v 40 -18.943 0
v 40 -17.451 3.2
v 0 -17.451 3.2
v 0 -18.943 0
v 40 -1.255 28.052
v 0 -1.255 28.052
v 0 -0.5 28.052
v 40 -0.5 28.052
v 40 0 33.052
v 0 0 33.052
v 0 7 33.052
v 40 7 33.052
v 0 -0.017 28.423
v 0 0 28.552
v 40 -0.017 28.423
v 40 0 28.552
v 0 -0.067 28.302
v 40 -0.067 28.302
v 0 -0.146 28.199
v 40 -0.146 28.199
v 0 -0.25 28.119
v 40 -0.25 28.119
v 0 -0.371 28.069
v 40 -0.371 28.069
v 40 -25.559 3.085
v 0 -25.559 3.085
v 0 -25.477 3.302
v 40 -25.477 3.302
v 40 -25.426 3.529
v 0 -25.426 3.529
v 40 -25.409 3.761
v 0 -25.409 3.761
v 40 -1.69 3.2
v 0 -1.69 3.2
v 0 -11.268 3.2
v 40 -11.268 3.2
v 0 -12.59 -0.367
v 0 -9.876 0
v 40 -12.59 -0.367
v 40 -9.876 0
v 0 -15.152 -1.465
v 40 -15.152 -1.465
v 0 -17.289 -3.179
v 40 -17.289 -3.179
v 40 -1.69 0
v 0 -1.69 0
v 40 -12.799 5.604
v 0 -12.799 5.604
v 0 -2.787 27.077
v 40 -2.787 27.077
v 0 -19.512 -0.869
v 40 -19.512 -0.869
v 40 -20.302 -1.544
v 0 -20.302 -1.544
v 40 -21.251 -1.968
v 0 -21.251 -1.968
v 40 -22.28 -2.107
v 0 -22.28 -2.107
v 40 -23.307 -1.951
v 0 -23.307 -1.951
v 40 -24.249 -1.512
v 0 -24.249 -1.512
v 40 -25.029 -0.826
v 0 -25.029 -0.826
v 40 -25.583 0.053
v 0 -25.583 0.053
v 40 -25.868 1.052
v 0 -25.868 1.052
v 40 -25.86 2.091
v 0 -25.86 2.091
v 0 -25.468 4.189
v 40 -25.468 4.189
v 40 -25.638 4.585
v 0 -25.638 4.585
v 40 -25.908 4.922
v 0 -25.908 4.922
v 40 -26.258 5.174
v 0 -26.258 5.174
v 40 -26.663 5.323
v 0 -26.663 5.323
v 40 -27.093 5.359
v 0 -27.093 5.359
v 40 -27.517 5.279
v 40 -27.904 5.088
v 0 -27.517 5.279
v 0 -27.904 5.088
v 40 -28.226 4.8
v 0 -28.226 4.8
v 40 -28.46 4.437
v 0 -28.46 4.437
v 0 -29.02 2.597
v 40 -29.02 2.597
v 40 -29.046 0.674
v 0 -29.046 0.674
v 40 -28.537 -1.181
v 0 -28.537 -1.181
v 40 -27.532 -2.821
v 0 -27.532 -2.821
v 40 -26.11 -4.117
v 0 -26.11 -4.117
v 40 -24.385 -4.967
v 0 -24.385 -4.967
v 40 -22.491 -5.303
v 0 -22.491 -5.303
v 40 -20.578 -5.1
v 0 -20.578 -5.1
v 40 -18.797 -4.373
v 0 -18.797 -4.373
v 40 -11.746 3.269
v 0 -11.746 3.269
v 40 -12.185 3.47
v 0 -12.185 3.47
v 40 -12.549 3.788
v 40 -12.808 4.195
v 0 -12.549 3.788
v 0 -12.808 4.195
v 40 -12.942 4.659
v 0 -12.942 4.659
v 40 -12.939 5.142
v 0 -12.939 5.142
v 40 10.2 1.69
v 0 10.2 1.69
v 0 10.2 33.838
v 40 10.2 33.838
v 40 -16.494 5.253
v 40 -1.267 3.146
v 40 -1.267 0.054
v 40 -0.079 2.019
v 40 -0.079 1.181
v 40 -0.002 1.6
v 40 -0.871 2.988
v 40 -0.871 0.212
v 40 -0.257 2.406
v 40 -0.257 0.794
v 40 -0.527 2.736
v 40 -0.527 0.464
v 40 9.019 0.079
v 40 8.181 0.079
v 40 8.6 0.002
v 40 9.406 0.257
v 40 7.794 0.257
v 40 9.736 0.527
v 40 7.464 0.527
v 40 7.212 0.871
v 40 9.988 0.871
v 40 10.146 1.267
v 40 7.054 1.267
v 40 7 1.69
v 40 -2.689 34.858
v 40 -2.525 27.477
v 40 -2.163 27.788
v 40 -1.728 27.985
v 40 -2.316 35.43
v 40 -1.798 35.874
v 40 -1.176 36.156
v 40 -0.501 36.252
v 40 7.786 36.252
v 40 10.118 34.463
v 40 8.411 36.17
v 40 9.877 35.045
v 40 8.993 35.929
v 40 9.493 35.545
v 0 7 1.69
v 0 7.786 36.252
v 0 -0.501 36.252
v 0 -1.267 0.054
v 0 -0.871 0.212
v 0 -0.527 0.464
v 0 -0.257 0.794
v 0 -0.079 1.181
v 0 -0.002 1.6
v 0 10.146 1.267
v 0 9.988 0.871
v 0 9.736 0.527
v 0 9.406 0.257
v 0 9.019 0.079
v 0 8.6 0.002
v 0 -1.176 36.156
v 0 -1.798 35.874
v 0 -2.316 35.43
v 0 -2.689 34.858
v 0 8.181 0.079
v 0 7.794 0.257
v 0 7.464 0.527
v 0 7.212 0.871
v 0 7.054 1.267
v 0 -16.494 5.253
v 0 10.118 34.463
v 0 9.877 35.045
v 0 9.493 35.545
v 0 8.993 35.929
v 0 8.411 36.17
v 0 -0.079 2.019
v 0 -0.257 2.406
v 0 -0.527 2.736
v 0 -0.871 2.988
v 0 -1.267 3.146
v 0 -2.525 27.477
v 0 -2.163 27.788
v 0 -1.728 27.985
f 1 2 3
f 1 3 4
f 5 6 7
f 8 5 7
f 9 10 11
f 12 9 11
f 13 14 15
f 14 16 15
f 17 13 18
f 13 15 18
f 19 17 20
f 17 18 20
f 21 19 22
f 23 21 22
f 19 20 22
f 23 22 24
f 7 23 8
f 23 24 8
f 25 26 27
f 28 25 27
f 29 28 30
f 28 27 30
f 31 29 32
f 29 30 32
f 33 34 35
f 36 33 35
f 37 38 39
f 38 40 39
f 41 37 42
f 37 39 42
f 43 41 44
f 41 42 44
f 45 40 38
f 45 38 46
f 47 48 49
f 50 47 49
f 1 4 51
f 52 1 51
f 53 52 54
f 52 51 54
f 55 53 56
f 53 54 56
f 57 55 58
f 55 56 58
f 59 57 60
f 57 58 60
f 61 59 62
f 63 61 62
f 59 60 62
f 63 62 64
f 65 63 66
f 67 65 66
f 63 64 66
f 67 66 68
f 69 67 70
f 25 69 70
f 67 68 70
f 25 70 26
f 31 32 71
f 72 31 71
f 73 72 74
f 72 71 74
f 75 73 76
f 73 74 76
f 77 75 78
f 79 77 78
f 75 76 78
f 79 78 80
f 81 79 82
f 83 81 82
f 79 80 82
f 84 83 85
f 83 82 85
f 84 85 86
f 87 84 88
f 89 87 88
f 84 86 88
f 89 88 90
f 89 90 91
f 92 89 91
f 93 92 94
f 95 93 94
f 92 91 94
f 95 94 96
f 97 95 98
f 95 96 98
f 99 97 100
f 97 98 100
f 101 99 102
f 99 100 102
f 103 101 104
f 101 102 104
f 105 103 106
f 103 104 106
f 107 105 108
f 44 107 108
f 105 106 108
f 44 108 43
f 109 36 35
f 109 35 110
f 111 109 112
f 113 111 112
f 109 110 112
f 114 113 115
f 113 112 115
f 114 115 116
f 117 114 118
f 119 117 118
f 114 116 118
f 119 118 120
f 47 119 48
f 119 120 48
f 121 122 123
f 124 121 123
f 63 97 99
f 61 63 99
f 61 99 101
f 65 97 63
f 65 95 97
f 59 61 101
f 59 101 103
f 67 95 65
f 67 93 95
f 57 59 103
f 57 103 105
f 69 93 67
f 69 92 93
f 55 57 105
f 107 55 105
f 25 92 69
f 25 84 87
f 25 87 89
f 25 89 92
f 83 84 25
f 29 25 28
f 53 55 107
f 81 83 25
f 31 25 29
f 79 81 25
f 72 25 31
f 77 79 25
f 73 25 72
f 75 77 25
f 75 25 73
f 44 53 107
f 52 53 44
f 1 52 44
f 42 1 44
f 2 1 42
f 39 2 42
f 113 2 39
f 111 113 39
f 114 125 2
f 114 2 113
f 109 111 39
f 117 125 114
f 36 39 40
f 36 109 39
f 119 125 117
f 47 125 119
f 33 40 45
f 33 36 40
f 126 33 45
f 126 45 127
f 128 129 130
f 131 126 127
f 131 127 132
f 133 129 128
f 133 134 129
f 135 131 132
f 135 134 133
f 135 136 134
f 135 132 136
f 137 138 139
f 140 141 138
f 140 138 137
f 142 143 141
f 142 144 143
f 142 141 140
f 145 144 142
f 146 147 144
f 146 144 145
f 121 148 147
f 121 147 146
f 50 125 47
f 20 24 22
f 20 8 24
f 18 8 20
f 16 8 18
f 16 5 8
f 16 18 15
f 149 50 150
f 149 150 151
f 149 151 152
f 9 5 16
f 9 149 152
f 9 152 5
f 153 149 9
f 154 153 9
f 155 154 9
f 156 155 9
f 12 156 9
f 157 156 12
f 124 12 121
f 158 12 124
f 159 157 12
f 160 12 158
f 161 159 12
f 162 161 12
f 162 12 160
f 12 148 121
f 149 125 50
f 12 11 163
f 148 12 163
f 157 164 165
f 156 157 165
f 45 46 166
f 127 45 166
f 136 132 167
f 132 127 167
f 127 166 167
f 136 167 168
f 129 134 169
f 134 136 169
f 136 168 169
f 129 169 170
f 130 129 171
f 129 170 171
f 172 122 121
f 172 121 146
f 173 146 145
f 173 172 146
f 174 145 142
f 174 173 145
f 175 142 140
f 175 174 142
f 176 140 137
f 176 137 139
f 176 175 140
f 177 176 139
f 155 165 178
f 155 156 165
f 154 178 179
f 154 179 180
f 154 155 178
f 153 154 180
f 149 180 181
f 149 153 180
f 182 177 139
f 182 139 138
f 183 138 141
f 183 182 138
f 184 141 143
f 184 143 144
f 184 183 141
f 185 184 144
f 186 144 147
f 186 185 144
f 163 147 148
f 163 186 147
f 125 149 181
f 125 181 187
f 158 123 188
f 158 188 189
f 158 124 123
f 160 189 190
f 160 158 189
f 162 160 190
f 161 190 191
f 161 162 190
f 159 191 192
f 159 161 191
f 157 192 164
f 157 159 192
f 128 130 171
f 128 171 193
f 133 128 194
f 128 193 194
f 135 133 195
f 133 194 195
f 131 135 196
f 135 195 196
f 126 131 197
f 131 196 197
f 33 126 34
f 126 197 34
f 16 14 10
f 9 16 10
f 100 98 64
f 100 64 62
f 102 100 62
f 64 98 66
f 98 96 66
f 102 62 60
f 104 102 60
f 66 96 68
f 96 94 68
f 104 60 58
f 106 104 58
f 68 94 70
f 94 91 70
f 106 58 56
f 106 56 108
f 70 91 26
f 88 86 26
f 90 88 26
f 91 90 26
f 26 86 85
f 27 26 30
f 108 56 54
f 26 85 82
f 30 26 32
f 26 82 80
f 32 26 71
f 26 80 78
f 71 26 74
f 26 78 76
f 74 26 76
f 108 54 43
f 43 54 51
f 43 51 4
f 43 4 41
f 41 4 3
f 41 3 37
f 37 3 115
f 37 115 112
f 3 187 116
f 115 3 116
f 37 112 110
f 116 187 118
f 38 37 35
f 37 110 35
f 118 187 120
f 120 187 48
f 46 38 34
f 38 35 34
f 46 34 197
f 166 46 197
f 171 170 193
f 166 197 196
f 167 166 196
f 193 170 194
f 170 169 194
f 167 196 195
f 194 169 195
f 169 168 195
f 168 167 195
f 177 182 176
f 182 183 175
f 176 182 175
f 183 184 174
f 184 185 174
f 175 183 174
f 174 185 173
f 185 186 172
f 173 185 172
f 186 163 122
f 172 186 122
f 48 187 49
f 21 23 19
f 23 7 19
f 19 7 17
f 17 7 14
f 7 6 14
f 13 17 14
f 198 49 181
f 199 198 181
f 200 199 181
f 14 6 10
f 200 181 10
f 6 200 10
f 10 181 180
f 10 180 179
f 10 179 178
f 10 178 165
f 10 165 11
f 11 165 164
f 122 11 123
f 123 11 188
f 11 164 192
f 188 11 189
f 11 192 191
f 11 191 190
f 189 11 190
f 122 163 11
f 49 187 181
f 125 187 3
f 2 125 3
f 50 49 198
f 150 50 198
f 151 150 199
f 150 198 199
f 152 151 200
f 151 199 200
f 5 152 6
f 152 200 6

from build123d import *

# Parameters (mm, degrees)
F1_DEPTH    = 40
F2_R        = 2.4142135624
F3_R        = 10.2321597652
F4_T1_DEPTH = 40
F4_T3_DEPTH = 48.4497474683
F5_R        = 0.5


# Not quite as in the source:
# - a fillet or chamfer that OpenCascade refuses, or shapes differently, is made with other operations: its cross-section is extruded or revolved along the edge and cut away or added


with BuildPart() as f1:
    # F0 (on Right) → F1 (new body)
    with BuildSketch(Plane.YZ):
        with BuildLine():
            ThreePointArc((-25.4094946088, 3.7613025295), (-26.6631912182, 5.323376139), (-28.4595870608, 4.4374917638))
            ThreePointArc((-28.4595870608, 4.4374917638), (-27.6856838354, 2.3112100739), (-25.5594021496, 3.0851133107))
            ThreePointArc((-25.5594021496, 3.0851133107), (-25.4474209974, 3.4149991472), (-25.4094946088, 3.7613025295))
        make_face()
        with BuildLine():
            ThreePointArc((-16.0431703857, -1.3523784376), (-15.774850852, -0.6883818658), (-15.577323066, 0))
            Line((-15.577323066, 0), (-18.9433553042, 0))
            ThreePointArc((-18.9433553042, 0), (-23.7939353822, -1.7654667673), (-25.5594021496, 3.0851133107))
            ThreePointArc((-25.5594021496, 3.0851133107), (-27.6856838354, 2.3112100739), (-28.4595870608, 4.4374917638))
            ThreePointArc((-28.4595870608, 4.4374917638), (-25.1463138276, -4.6656516822), (-16.0431703857, -1.3523784376))
        make_face()
        with BuildLine():
            ThreePointArc((-15.4013787269, 1.5425566554), (-15.4524550708, 2.3775040298), (-15.604922411, 3.2))
            Line((-15.604922411, 3.2), (-17.4511707981, 3.2))
            Line((-17.4511707981, 3.2), (-18.9433553042, 0))
            Line((-18.9433553042, 0), (-15.577323066, 0))
            ThreePointArc((-15.577323066, 0), (-15.4455069504, 0.7662774779), (-15.4013787269, 1.5425566554))
        make_face()
        with BuildLine():
            Line((-15.4125459635, 0), (-13.9203614574, 3.2))
            Line((-13.9203614574, 3.2), (-15.604922411, 3.2))
            ThreePointArc((-15.604922411, 3.2), (-15.4524550708, 2.3775040298), (-15.4013787269, 1.5425566554))
            ThreePointArc((-15.4013787269, 1.5425566554), (-15.4455069504, 0.7662774779), (-15.577323066, 0))
            Line((-15.577323066, 0), (-15.4125459635, 0))
        make_face()
        Polygon((-2.0386248346, 0), (0, 0), (0, 3.2), (-13.9203614574, 3.2), (-15.4125459635, 0), align=None)
        with BuildLine():
            Line((-15.604922411, 3.2), (-13.9203614574, 3.2))
            Line((-13.9203614574, 3.2), (-2.3315382908, 28.0523114815))
            Line((-2.3315382908, 28.0523114815), (0, 33.0523114815))
            Line((0, 33.0523114815), (7, 33.0523114815))
            Line((7, 33.0523114815), (7, 0))
            Line((7, 0), (10.2, 0))
            Line((10.2, 0), (10.2, 36.2523114815))
            Line((10.2, 36.2523114815), (-2.0386248346, 36.2523114815))
            Line((-2.0386248346, 36.2523114815), (-16.4936271239, 5.253459036))
            ThreePointArc((-16.4936271239, 5.253459036), (-15.9648640306, 4.2632611548), (-15.604922411, 3.2))
        make_face()
        with BuildLine():
            Line((-16.0431703857, -1.3523784376), (-15.4125459635, 0))
            Line((-15.4125459635, 0), (-15.577323066, 0))
            ThreePointArc((-15.577323066, 0), (-15.774850852, -0.6883818658), (-16.0431703857, -1.3523784376))
        make_face()
        with BuildLine():
            Line((-17.4511707981, 3.2), (-15.604922411, 3.2))
            ThreePointArc((-15.604922411, 3.2), (-15.9648640306, 4.2632611548), (-16.4936271239, 5.253459036))
            Line((-16.4936271239, 5.253459036), (-17.4511707981, 3.2))
        make_face()
        Polygon((-2.3315382908, 28.0523114815), (0, 28.0523114815), (0, 33.0523114815), align=None)
    extrude(amount=F1_DEPTH)

    # F2
    f2_edges = [f1.edges().sort_by_distance(p)[0] for p in [
        (20, -2.038625, 36.252311),
        (20, 10.2, 36.252311),
    ]]
    fillet(f2_edges, radius=F2_R)

    # F3
    f3_edges = [f1.edges().sort_by_distance(p)[0] for p in [
        (20, -15.412546, 0),
    ]]
    fillet(f3_edges, radius=F3_R)

    # F4: fillet of radius 1.6899494937 on 6 edges, made by hand

    # F4_s2 → F4_t1 (join)
    with BuildSketch(Plane.YZ):
        with BuildLine():
            ThreePointArc((-11.2676721112, 3.2), (-12.692961058, 3.9819402926), (-12.799286497, 5.6041530111))
            Line((-12.799286497, 5.6041530111), (-13.9203614574, 3.2))
            Line((-13.9203614574, 3.2), (-11.2676721112, 3.2))
        make_face()
        with BuildLine():
            ThreePointArc((-2.7865361119, 27.0765655052), (-2.1629309272, 27.7876509346), (-1.2549217261, 28.0523114815))
            Line((-1.2549217261, 28.0523114815), (-2.3315382908, 28.0523114815))
            Line((-2.3315382908, 28.0523114815), (-2.7865361119, 27.0765655052))
        make_face()
    extrude(amount=F4_T1_DEPTH)

    # F4_s4 → F4_t3 (cut)
    with BuildSketch(Plane.YZ.offset(-4.2248737342)):
        with BuildLine():
            ThreePointArc((8.6899494937, 0), (7.4949747468, 0.4949747468), (7, 1.6899494937))
            Line((7, 1.6899494937), (7, 0))
            Line((7, 0), (8.6899494937, 0))
        make_face()
        with BuildLine():
            ThreePointArc((0, 1.5100505063), (-0.4949747468, 2.7050252532), (-1.6899494937, 3.2))
            Line((-1.6899494937, 3.2), (0, 3.2))
            Line((0, 3.2), (0, 1.5100505063))
        make_face()
        with BuildLine():
            ThreePointArc((-1.6899494937, 0), (-0.4949747468, 0.4949747468), (0, 1.6899494937))
            Line((0, 1.6899494937), (0, 0))
            Line((0, 0), (-1.6899494937, 0))
        make_face()
        with BuildLine():
            ThreePointArc((10.2, 1.6899494937), (9.7050252532, 0.4949747468), (8.5100505063, 0))
            Line((8.5100505063, 0), (10.2, 0))
            Line((10.2, 0), (10.2, 1.6899494937))
        make_face()
    extrude(amount=F4_T3_DEPTH, mode=Mode.SUBTRACT)

    # F5
    f5_edges = [f1.edges().sort_by_distance(p)[0] for p in [
        (20, 0, 28.052311),
    ]]
    fillet(f5_edges, radius=F5_R)


solid = f1.part
